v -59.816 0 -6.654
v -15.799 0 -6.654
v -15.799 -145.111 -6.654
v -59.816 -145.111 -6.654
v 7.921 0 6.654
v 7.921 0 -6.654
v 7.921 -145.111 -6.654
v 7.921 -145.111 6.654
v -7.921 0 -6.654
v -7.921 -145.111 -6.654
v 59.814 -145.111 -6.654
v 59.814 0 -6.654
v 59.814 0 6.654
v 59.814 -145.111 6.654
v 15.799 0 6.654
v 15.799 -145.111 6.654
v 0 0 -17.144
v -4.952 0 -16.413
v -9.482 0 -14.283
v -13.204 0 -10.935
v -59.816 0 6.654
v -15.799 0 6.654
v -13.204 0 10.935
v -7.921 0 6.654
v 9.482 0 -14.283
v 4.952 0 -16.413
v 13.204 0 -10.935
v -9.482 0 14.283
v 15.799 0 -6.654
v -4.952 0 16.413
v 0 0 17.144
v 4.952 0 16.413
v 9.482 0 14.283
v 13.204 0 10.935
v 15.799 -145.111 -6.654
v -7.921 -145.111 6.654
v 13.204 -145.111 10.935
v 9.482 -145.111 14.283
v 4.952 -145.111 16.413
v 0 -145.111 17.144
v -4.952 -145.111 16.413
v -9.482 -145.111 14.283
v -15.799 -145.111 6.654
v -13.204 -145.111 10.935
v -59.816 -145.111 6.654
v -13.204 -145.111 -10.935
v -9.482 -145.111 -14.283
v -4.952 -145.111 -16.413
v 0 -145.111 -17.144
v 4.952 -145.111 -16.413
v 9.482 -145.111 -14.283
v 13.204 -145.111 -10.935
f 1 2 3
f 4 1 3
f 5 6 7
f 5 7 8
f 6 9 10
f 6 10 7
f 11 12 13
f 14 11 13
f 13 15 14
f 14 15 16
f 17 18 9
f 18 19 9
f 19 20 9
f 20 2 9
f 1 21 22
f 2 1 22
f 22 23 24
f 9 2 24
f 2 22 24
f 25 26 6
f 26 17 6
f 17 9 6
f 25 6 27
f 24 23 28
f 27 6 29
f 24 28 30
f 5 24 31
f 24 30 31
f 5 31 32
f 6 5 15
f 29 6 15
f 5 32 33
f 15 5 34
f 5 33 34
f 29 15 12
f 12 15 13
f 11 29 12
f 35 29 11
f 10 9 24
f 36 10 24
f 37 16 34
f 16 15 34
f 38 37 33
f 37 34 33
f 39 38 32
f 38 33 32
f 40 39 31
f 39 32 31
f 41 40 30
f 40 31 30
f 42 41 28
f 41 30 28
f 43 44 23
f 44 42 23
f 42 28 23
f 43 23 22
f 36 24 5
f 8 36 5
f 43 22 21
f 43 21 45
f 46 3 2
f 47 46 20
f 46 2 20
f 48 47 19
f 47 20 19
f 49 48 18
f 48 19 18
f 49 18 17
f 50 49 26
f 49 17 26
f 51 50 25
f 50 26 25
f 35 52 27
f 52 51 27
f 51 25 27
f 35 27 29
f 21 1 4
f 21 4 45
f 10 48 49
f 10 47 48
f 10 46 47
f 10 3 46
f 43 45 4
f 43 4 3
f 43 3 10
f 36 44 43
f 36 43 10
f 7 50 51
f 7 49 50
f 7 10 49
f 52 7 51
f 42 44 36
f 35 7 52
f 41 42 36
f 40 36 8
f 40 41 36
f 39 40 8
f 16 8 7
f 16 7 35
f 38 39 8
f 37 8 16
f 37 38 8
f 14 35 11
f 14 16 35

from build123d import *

# Parameters (mm, degrees)
F0_R     = 17.1435260445
F1_DEPTH = 145.1113671064
F2_W     = 15.8428698778
F2_H     = 13.308968395
F3_DEPTH = 239.869505167
F4_DEPTH = 51.8945604563
F5_DEPTH = 51.8922


with BuildPart() as f1:
    # F0 (on Front) → F1 (new body)
    with BuildSketch(Plane.XZ):
        Circle(F0_R)
    extrude(amount=F1_DEPTH)

    # F2 (on Front) → F3 (cut)
    with BuildSketch(Plane.XZ):
        Rectangle(F2_W, F2_H)
    extrude(amount=F3_DEPTH, mode=Mode.SUBTRACT)

    # F4 (add): a face of the model
    f4_faces = [f1.faces().sort_by_distance(p)[0] for p in [
        (-7.9214349389, -72.5556835532, 0),
    ]]
    extrude(f4_faces, amount=-F4_DEPTH)

    # F5 (add): a face of the model
    f5_faces = [f1.faces().sort_by_distance(p)[0] for p in [
        (7.9214349389, -72.5556835532, 0),
    ]]
    extrude(f5_faces, amount=-F5_DEPTH)


solid = f1.part
